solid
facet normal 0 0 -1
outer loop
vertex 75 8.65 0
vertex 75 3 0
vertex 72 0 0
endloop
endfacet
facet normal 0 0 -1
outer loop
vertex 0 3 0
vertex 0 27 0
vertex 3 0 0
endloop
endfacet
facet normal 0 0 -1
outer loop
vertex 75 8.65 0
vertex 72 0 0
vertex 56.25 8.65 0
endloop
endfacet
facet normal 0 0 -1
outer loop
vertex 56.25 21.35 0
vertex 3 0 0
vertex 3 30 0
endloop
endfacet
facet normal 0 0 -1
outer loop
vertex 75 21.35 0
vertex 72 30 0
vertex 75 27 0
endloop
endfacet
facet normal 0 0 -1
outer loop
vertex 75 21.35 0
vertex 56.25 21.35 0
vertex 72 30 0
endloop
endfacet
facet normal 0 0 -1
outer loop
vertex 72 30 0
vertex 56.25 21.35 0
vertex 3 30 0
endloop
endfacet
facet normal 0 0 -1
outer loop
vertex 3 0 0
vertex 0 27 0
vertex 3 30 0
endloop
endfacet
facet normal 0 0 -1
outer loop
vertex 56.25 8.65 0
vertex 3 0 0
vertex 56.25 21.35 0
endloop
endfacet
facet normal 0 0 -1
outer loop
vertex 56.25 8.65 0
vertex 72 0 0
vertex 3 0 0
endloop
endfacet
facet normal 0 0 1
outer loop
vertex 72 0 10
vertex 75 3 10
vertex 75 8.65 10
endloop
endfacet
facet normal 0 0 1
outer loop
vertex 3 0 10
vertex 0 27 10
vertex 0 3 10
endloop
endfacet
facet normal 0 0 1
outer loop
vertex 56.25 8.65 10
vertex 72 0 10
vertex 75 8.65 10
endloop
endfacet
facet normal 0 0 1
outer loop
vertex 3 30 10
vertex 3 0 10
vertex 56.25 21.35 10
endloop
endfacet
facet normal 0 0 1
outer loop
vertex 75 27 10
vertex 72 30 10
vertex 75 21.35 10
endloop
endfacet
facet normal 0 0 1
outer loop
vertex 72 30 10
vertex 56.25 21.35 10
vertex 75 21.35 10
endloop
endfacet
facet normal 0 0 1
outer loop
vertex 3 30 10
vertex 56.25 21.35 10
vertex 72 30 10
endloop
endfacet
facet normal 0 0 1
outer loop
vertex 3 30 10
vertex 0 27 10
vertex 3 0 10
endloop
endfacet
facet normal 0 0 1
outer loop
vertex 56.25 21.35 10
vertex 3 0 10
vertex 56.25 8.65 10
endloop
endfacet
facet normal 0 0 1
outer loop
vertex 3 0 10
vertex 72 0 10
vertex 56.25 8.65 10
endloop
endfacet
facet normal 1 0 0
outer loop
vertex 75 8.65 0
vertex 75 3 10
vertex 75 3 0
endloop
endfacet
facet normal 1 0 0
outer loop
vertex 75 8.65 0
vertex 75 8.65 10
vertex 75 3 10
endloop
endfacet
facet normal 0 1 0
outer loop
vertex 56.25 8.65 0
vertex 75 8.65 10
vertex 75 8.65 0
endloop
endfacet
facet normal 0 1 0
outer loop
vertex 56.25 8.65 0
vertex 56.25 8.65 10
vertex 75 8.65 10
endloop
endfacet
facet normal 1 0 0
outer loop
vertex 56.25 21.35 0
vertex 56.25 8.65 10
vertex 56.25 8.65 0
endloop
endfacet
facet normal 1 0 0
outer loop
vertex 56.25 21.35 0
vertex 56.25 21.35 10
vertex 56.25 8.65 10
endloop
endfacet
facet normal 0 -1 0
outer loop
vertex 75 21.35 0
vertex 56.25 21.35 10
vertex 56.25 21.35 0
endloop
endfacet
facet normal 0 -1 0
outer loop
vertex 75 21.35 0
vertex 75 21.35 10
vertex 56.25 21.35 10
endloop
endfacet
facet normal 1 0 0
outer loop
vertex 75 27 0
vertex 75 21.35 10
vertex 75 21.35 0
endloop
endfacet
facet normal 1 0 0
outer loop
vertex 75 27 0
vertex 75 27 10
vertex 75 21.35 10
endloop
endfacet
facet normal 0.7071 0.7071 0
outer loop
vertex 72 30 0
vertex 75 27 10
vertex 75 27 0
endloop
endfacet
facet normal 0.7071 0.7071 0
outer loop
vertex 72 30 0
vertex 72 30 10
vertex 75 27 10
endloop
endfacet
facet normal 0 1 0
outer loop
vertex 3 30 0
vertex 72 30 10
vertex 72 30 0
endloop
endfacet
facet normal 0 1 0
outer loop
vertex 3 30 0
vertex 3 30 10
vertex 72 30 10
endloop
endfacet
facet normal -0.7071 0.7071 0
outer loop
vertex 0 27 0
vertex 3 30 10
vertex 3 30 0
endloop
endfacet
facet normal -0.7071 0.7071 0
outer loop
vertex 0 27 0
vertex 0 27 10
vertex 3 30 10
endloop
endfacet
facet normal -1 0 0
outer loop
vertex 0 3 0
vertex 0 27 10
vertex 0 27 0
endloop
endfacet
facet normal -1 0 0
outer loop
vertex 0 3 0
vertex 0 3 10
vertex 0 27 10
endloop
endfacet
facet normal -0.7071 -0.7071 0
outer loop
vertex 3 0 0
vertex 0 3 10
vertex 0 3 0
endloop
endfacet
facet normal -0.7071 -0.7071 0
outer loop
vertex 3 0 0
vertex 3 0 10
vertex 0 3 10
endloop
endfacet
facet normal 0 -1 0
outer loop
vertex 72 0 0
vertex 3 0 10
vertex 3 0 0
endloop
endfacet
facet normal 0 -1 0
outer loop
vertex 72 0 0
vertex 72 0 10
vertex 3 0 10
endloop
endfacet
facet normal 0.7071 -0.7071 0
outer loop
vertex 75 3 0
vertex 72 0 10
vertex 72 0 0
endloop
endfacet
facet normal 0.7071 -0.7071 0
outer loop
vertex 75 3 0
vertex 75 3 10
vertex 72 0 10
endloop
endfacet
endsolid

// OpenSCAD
$fn = 32;

// ----------------------------------------------------------------------
// C washer: 75 x 30 mm plate with an open slot
// ----------------------------------------------------------------------

// --- parameters (mm) ---
profile_height = 10;      // extrusion height
profile_points = 12;      // points of the closed outline

profile = [[3, 0], [72, 0], [75, 3], [75, 8.65], [56.25, 8.65], [56.25, 21.35], [75, 21.35], [75, 27], [72, 30], [3, 30], [0, 27], [0, 3]];  // single closed polygon, 12 points, counter clockwise

// --- the one profile operation ---
linear_extrude(height = profile_height) polygon(points = profile);
